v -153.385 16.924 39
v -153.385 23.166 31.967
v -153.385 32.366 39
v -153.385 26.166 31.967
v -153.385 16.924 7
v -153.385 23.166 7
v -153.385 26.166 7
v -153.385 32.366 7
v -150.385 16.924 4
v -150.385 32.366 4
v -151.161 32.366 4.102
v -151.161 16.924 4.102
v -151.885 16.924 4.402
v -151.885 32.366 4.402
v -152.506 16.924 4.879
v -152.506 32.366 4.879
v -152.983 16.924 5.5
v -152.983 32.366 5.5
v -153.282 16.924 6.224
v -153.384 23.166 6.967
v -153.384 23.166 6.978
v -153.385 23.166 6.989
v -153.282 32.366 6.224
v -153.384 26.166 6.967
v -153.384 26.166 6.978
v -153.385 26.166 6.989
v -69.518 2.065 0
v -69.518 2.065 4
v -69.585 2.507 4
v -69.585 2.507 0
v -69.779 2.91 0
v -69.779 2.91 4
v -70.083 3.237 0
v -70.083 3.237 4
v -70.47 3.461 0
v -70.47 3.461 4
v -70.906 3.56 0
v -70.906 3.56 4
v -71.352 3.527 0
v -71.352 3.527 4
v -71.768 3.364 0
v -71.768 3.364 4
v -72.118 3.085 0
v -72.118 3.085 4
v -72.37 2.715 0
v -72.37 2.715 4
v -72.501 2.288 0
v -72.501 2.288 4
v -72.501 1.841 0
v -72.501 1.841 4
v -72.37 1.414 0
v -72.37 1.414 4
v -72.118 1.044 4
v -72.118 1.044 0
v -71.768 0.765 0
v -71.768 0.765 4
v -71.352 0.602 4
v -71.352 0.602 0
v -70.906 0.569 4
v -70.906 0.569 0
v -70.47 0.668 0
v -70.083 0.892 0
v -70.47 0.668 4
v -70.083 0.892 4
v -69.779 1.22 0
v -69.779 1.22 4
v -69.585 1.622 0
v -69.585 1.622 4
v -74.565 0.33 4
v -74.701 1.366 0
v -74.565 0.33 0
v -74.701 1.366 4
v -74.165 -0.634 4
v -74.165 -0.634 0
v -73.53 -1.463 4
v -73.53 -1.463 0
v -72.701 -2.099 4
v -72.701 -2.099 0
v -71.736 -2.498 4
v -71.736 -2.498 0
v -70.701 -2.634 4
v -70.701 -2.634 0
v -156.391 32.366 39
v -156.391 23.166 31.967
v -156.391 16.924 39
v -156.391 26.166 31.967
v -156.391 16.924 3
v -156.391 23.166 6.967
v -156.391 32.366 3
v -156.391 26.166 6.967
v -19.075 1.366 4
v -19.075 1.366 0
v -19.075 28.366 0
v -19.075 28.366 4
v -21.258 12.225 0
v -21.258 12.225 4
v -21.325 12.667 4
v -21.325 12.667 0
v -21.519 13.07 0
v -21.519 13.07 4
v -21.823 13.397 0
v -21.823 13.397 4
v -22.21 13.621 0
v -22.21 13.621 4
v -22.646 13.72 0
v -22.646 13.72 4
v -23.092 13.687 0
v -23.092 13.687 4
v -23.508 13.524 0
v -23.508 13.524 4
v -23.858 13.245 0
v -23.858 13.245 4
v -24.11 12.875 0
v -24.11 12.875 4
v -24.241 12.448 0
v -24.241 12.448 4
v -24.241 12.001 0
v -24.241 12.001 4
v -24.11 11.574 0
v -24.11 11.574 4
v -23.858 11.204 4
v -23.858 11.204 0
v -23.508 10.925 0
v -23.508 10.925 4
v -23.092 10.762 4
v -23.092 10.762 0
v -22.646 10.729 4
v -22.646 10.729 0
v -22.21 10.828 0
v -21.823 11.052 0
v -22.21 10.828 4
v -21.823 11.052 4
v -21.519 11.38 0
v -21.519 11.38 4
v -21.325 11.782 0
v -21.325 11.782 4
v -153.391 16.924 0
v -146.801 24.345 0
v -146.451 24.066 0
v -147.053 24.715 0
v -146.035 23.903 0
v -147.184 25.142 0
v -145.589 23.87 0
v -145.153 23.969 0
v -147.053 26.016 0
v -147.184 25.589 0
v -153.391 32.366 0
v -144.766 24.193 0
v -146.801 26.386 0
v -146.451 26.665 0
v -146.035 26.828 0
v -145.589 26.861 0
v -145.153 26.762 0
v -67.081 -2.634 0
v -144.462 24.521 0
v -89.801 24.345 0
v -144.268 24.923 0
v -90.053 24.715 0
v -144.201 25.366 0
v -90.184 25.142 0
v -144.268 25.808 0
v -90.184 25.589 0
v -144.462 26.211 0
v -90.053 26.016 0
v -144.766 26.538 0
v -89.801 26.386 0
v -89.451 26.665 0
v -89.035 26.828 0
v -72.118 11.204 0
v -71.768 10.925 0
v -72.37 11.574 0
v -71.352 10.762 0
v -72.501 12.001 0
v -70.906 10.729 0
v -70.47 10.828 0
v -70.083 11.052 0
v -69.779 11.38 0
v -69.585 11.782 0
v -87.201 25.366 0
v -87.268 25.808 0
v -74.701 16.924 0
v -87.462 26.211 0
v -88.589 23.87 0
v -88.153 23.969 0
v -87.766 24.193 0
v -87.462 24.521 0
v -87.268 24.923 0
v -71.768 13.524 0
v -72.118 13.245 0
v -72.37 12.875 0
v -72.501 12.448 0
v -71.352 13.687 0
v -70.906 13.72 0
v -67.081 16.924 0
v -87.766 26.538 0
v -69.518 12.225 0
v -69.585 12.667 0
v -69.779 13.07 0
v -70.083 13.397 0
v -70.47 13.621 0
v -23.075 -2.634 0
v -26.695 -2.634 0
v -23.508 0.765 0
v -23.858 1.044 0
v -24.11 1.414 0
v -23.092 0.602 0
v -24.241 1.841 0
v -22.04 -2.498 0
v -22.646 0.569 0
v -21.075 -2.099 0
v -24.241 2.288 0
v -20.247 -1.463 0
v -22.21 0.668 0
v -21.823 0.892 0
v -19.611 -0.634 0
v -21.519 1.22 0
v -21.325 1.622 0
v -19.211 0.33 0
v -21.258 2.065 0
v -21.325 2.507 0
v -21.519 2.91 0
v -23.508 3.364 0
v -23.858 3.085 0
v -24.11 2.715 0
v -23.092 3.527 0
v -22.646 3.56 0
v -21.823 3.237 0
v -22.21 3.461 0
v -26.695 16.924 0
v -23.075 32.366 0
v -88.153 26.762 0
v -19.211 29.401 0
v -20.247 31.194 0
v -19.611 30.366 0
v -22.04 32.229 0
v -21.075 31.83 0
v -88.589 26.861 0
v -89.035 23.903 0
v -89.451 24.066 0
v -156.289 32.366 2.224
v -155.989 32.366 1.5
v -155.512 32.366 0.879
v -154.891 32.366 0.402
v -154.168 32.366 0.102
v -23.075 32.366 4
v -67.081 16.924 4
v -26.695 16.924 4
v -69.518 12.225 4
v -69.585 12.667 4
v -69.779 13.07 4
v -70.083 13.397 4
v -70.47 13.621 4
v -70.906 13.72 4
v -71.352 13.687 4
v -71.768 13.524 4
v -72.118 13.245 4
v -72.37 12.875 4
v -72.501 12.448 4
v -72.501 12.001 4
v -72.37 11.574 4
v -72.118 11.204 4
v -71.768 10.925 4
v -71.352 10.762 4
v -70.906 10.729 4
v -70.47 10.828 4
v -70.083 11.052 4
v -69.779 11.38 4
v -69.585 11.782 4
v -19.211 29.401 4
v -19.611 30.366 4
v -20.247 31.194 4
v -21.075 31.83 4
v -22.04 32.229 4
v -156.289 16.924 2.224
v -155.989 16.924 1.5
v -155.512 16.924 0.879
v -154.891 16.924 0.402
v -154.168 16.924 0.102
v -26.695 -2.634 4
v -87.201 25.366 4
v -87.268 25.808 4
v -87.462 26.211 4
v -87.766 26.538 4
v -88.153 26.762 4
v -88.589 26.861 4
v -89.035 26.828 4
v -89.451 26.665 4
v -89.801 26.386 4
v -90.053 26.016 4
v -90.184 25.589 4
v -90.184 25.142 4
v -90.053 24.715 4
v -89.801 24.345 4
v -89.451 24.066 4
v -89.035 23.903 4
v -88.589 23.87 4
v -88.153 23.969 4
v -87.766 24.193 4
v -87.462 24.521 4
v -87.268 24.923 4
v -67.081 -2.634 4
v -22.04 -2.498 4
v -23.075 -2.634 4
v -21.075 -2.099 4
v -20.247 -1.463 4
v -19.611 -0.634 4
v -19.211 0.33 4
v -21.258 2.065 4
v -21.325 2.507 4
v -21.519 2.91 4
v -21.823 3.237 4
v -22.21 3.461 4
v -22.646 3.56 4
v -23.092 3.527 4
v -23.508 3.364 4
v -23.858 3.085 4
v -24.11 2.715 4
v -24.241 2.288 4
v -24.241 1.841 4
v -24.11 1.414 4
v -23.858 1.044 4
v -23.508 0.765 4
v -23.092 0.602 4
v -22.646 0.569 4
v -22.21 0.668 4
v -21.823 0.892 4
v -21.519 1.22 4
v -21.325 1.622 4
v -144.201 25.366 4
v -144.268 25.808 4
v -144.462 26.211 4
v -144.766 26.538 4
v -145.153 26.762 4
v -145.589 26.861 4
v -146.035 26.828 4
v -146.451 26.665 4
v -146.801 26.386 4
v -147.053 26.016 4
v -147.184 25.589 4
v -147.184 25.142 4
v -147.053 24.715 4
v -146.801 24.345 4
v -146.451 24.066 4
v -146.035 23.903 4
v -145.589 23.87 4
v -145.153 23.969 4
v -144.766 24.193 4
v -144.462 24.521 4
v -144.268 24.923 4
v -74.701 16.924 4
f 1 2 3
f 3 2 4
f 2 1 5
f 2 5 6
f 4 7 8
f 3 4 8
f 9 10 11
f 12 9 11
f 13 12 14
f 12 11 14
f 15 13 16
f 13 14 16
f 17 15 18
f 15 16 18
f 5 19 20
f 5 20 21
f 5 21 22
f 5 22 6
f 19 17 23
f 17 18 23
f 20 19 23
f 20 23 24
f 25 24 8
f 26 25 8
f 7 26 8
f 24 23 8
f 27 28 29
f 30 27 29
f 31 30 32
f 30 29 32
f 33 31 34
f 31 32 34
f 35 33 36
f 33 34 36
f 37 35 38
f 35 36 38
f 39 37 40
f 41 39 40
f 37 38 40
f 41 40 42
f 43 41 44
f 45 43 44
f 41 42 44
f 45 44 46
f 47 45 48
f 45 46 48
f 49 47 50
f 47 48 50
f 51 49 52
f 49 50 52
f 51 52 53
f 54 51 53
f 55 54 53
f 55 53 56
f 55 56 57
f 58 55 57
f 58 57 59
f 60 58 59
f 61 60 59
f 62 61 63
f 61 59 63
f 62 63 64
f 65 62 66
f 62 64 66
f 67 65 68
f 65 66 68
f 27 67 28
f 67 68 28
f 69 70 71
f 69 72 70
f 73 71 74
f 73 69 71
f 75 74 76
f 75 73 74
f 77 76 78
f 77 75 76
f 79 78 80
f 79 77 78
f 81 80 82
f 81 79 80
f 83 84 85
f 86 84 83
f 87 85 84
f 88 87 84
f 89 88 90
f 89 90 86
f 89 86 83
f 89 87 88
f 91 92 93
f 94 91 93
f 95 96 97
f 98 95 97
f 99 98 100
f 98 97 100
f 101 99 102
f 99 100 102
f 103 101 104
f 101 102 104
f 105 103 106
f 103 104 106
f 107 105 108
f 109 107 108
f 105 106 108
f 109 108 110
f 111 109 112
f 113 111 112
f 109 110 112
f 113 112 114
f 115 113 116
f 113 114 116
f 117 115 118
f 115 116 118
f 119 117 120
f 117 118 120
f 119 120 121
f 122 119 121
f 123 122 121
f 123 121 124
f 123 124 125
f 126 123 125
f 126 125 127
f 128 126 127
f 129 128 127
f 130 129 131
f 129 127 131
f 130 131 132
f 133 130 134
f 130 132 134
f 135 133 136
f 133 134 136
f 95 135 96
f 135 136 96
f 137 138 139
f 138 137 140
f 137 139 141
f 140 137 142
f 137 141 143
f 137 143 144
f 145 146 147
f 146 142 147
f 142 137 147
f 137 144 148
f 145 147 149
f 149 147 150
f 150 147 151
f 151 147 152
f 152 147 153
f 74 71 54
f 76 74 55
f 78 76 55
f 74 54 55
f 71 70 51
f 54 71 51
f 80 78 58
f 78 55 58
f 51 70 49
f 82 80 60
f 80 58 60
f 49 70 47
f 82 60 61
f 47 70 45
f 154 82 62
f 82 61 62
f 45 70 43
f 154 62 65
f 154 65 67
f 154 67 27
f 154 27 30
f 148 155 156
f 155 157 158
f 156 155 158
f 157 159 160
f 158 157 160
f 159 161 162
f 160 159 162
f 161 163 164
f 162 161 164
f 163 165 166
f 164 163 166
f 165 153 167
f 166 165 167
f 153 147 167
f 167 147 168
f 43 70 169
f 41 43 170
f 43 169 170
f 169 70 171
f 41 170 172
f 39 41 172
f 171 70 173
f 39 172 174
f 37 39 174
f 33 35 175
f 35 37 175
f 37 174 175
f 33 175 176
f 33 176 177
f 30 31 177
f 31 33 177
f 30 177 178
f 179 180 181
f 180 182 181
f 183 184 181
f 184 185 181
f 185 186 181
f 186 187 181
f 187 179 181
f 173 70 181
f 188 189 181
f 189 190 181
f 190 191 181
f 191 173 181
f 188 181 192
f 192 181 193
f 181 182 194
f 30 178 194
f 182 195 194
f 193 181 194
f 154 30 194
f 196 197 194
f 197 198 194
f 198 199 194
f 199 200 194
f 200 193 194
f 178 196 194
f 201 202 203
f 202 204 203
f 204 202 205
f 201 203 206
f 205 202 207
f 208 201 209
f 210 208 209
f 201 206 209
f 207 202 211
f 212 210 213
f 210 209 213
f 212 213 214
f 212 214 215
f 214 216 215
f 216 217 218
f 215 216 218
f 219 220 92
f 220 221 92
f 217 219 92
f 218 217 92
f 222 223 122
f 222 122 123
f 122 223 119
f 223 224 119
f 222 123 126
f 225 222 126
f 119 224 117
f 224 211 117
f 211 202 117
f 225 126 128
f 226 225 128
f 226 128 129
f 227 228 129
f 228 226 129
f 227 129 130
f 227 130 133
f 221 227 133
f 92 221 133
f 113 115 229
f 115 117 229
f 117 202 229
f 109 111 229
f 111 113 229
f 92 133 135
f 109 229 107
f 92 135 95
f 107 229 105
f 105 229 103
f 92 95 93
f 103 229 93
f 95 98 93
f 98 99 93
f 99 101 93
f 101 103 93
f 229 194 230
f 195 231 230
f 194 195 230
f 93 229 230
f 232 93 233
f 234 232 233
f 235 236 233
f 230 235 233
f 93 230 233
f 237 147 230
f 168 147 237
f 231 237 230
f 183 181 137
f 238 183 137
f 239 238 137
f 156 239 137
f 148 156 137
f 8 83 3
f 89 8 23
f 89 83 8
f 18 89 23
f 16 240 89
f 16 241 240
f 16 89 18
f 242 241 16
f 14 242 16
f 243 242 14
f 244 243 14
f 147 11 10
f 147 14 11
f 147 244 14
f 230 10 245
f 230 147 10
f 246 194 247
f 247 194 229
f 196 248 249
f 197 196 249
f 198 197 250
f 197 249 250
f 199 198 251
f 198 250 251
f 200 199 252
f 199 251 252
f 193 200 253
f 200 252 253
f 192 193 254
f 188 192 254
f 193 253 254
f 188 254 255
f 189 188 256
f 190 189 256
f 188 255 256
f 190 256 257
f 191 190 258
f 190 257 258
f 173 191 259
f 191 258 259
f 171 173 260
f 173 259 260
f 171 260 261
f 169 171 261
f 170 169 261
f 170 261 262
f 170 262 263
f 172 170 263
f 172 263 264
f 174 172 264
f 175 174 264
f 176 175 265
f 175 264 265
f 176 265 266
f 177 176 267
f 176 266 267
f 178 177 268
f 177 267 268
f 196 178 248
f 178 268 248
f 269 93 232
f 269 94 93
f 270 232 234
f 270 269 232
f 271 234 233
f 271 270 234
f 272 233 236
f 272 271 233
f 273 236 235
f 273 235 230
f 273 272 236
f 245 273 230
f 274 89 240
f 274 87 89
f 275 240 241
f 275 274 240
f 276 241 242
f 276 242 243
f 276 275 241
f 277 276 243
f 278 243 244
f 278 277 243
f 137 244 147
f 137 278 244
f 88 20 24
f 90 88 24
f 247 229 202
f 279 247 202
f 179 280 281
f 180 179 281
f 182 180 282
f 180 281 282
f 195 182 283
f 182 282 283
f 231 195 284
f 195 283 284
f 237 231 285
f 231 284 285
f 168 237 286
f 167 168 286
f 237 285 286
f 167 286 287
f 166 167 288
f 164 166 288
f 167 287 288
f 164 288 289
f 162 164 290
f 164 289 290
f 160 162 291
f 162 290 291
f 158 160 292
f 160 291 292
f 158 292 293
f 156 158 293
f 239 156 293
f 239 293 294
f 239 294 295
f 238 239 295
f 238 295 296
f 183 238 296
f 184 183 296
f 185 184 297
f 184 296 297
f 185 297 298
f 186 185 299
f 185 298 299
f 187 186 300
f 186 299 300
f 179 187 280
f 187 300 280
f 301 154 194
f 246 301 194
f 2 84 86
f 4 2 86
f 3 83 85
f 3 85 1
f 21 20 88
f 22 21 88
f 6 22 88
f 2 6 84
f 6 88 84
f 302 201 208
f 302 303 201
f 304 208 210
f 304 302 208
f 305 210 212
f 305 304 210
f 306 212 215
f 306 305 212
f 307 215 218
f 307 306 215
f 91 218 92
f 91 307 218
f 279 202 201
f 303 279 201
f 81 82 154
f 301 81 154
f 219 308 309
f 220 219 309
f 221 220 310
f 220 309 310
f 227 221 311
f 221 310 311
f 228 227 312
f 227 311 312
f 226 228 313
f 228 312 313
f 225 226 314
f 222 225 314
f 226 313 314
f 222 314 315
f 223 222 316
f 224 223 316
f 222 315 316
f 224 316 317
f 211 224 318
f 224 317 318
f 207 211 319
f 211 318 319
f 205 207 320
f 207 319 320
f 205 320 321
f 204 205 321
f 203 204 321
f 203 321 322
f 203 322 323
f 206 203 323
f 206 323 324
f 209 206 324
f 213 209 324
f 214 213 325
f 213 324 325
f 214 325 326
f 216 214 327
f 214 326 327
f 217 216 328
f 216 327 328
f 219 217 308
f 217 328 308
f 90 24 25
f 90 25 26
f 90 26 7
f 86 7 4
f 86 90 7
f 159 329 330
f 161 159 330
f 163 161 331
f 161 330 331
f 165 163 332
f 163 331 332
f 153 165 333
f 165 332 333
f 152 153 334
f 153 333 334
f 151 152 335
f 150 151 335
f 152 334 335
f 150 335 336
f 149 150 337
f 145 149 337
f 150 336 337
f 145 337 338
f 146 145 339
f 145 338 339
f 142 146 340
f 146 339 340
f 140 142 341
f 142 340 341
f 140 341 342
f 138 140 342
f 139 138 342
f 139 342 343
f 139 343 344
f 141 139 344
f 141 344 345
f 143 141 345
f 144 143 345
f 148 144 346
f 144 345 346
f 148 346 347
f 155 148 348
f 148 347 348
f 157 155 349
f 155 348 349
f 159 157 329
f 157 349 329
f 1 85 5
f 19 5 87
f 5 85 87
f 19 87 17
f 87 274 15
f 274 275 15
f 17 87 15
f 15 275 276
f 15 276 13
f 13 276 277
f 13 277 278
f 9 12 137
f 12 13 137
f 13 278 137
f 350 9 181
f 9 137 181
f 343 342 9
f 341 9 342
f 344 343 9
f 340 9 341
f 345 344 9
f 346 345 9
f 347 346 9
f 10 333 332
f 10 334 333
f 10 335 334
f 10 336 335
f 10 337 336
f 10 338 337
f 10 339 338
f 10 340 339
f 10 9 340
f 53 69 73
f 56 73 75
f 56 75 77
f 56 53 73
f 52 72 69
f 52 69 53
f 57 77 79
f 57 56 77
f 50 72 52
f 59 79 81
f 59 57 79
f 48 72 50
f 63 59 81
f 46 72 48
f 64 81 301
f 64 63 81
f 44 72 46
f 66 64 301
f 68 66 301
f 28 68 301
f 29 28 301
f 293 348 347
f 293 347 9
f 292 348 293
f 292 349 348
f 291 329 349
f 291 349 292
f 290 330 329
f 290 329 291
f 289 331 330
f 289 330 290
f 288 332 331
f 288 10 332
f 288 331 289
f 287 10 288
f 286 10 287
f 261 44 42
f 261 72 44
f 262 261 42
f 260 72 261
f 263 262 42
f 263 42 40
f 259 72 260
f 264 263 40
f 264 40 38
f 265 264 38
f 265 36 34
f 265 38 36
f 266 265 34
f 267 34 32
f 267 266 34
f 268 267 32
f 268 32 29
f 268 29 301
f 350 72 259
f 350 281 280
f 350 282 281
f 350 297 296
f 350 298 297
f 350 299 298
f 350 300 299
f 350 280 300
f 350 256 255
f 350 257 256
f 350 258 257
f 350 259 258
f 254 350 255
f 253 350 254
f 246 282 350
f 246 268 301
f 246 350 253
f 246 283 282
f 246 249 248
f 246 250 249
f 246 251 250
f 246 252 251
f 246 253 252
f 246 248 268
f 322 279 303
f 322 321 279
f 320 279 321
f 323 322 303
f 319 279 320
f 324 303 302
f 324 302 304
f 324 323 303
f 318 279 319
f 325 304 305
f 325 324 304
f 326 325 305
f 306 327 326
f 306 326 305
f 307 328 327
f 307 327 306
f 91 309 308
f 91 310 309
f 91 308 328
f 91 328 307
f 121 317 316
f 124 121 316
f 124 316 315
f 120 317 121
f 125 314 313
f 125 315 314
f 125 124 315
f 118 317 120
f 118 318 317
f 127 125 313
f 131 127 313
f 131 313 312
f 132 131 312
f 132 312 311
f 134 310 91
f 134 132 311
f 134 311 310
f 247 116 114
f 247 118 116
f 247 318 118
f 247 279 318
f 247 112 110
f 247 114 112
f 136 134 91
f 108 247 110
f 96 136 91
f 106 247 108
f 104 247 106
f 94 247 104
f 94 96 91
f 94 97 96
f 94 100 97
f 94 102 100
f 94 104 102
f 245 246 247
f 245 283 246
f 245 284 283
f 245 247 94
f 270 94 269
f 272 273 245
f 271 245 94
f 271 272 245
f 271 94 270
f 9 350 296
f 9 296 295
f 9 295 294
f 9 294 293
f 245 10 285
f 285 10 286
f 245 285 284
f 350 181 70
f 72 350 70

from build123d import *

# Parameters (mm, degrees)
BOSS_EXTRUDE2_DEPTH     = 4
FILLET1_R               = 4
SKETCH6_R               = 1.5
CUT_EXTRUDE1_DEPTH      = 4
SKETCH3_R               = 1.5
CUT_EXTRUDE2_DEPTH      = 4
SKETCH7_W               = 3.00651588
SKETCH7_H               = 15.442
BOSS_EXTRUDE3_DEPTH     = 35
FILLET2_R               = 3
FILLET3_R               = 3
SKETCH8_W               = 25
SKETCH8_H               = 3
CUT_EXTRUDE6_DEPTH      = 4
CUT_EXTRUDE6_DEPTH_BACK = 4


with BuildPart() as part:
    # Sketch2 → Boss-Extrude2 (new body)
    with BuildSketch(Plane.XY):
        Polygon((-67.081093968, -2.634474623), (-67.081093968, 16.923525377), (-26.695093968, 16.923525377), (-26.695093968, -2.634474623), (-19.075093968, -2.634474623), (-19.075093968, 32.365525377), (-67.081093968, 32.365525377), (-74.701093968, 32.365525377), (-156.39106061, 32.365525377), (-156.39106061, 16.923525377), (-74.701093968, 16.923525377), (-74.701093968, -2.634474623), align=None)
    extrude(amount=BOSS_EXTRUDE2_DEPTH)

    # Fillet1
    fillet1_edges = [part.edges().sort_by_distance(p)[0] for p in [
        (-19.075093968, 32.365525377, 2),
        (-19.075093968, -2.634474623, 2),
        (-74.701093968, -2.634474623, 2),
    ]]
    fillet(fillet1_edges, radius=FILLET1_R)

    # Sketch6 → Cut-Extrude1 (cut)
    with BuildSketch(Plane.XY.offset(4)):
        with Locations((-71.018093968, 12.224525377)):
            Circle(SKETCH6_R)
        with Locations((-22.758093968, 12.224525377)):
            Circle(SKETCH6_R)
        with Locations((-22.758093968, 2.064525377)):
            Circle(SKETCH6_R)
        with Locations((-71.018093968, 2.064525377)):
            Circle(SKETCH6_R)
    extrude(amount=-CUT_EXTRUDE1_DEPTH, mode=Mode.SUBTRACT)

    # Sketch3 → Cut-Extrude2 (cut)
    with BuildSketch(Plane.XY.offset(4)):
        with Locations((-145.701093968, 25.365525377)):
            Circle(SKETCH3_R)
        with Locations((-88.701093968, 25.365525377)):
            Circle(SKETCH3_R)
    extrude(amount=-CUT_EXTRUDE2_DEPTH, mode=Mode.SUBTRACT)

    # Sketch7 → Boss-Extrude3 (add)
    with BuildSketch(Plane.XY.offset(4)):
        with Locations((-154.88780267, 24.644525377)):
            Rectangle(SKETCH7_W, SKETCH7_H)
    extrude(amount=BOSS_EXTRUDE3_DEPTH)

    # Fillet2
    fillet2_edges = [part.edges().sort_by_distance(p)[0] for p in [
        (-153.38454473, 24.644525377, 4),
    ]]
    fillet(fillet2_edges, radius=FILLET2_R)

    # Fillet3
    fillet3_edges = [part.edges().sort_by_distance(p)[0] for p in [
        (-156.39106061, 24.644525377, 0),
    ]]
    fillet(fillet3_edges, radius=FILLET3_R)

    # Sketch8 → Cut-Extrude6 (cut, two sides)
    with BuildSketch(Plane.ZY.offset(156.39106061)) as cut_extrude6_sk:
        with Locations((19.4669967, 24.665525377)):
            Rectangle(SKETCH8_W, SKETCH8_H)
    extrude(amount=CUT_EXTRUDE6_DEPTH, mode=Mode.SUBTRACT)
    extrude(cut_extrude6_sk.sketch, amount=-CUT_EXTRUDE6_DEPTH_BACK, mode=Mode.SUBTRACT)


solid = part.part
